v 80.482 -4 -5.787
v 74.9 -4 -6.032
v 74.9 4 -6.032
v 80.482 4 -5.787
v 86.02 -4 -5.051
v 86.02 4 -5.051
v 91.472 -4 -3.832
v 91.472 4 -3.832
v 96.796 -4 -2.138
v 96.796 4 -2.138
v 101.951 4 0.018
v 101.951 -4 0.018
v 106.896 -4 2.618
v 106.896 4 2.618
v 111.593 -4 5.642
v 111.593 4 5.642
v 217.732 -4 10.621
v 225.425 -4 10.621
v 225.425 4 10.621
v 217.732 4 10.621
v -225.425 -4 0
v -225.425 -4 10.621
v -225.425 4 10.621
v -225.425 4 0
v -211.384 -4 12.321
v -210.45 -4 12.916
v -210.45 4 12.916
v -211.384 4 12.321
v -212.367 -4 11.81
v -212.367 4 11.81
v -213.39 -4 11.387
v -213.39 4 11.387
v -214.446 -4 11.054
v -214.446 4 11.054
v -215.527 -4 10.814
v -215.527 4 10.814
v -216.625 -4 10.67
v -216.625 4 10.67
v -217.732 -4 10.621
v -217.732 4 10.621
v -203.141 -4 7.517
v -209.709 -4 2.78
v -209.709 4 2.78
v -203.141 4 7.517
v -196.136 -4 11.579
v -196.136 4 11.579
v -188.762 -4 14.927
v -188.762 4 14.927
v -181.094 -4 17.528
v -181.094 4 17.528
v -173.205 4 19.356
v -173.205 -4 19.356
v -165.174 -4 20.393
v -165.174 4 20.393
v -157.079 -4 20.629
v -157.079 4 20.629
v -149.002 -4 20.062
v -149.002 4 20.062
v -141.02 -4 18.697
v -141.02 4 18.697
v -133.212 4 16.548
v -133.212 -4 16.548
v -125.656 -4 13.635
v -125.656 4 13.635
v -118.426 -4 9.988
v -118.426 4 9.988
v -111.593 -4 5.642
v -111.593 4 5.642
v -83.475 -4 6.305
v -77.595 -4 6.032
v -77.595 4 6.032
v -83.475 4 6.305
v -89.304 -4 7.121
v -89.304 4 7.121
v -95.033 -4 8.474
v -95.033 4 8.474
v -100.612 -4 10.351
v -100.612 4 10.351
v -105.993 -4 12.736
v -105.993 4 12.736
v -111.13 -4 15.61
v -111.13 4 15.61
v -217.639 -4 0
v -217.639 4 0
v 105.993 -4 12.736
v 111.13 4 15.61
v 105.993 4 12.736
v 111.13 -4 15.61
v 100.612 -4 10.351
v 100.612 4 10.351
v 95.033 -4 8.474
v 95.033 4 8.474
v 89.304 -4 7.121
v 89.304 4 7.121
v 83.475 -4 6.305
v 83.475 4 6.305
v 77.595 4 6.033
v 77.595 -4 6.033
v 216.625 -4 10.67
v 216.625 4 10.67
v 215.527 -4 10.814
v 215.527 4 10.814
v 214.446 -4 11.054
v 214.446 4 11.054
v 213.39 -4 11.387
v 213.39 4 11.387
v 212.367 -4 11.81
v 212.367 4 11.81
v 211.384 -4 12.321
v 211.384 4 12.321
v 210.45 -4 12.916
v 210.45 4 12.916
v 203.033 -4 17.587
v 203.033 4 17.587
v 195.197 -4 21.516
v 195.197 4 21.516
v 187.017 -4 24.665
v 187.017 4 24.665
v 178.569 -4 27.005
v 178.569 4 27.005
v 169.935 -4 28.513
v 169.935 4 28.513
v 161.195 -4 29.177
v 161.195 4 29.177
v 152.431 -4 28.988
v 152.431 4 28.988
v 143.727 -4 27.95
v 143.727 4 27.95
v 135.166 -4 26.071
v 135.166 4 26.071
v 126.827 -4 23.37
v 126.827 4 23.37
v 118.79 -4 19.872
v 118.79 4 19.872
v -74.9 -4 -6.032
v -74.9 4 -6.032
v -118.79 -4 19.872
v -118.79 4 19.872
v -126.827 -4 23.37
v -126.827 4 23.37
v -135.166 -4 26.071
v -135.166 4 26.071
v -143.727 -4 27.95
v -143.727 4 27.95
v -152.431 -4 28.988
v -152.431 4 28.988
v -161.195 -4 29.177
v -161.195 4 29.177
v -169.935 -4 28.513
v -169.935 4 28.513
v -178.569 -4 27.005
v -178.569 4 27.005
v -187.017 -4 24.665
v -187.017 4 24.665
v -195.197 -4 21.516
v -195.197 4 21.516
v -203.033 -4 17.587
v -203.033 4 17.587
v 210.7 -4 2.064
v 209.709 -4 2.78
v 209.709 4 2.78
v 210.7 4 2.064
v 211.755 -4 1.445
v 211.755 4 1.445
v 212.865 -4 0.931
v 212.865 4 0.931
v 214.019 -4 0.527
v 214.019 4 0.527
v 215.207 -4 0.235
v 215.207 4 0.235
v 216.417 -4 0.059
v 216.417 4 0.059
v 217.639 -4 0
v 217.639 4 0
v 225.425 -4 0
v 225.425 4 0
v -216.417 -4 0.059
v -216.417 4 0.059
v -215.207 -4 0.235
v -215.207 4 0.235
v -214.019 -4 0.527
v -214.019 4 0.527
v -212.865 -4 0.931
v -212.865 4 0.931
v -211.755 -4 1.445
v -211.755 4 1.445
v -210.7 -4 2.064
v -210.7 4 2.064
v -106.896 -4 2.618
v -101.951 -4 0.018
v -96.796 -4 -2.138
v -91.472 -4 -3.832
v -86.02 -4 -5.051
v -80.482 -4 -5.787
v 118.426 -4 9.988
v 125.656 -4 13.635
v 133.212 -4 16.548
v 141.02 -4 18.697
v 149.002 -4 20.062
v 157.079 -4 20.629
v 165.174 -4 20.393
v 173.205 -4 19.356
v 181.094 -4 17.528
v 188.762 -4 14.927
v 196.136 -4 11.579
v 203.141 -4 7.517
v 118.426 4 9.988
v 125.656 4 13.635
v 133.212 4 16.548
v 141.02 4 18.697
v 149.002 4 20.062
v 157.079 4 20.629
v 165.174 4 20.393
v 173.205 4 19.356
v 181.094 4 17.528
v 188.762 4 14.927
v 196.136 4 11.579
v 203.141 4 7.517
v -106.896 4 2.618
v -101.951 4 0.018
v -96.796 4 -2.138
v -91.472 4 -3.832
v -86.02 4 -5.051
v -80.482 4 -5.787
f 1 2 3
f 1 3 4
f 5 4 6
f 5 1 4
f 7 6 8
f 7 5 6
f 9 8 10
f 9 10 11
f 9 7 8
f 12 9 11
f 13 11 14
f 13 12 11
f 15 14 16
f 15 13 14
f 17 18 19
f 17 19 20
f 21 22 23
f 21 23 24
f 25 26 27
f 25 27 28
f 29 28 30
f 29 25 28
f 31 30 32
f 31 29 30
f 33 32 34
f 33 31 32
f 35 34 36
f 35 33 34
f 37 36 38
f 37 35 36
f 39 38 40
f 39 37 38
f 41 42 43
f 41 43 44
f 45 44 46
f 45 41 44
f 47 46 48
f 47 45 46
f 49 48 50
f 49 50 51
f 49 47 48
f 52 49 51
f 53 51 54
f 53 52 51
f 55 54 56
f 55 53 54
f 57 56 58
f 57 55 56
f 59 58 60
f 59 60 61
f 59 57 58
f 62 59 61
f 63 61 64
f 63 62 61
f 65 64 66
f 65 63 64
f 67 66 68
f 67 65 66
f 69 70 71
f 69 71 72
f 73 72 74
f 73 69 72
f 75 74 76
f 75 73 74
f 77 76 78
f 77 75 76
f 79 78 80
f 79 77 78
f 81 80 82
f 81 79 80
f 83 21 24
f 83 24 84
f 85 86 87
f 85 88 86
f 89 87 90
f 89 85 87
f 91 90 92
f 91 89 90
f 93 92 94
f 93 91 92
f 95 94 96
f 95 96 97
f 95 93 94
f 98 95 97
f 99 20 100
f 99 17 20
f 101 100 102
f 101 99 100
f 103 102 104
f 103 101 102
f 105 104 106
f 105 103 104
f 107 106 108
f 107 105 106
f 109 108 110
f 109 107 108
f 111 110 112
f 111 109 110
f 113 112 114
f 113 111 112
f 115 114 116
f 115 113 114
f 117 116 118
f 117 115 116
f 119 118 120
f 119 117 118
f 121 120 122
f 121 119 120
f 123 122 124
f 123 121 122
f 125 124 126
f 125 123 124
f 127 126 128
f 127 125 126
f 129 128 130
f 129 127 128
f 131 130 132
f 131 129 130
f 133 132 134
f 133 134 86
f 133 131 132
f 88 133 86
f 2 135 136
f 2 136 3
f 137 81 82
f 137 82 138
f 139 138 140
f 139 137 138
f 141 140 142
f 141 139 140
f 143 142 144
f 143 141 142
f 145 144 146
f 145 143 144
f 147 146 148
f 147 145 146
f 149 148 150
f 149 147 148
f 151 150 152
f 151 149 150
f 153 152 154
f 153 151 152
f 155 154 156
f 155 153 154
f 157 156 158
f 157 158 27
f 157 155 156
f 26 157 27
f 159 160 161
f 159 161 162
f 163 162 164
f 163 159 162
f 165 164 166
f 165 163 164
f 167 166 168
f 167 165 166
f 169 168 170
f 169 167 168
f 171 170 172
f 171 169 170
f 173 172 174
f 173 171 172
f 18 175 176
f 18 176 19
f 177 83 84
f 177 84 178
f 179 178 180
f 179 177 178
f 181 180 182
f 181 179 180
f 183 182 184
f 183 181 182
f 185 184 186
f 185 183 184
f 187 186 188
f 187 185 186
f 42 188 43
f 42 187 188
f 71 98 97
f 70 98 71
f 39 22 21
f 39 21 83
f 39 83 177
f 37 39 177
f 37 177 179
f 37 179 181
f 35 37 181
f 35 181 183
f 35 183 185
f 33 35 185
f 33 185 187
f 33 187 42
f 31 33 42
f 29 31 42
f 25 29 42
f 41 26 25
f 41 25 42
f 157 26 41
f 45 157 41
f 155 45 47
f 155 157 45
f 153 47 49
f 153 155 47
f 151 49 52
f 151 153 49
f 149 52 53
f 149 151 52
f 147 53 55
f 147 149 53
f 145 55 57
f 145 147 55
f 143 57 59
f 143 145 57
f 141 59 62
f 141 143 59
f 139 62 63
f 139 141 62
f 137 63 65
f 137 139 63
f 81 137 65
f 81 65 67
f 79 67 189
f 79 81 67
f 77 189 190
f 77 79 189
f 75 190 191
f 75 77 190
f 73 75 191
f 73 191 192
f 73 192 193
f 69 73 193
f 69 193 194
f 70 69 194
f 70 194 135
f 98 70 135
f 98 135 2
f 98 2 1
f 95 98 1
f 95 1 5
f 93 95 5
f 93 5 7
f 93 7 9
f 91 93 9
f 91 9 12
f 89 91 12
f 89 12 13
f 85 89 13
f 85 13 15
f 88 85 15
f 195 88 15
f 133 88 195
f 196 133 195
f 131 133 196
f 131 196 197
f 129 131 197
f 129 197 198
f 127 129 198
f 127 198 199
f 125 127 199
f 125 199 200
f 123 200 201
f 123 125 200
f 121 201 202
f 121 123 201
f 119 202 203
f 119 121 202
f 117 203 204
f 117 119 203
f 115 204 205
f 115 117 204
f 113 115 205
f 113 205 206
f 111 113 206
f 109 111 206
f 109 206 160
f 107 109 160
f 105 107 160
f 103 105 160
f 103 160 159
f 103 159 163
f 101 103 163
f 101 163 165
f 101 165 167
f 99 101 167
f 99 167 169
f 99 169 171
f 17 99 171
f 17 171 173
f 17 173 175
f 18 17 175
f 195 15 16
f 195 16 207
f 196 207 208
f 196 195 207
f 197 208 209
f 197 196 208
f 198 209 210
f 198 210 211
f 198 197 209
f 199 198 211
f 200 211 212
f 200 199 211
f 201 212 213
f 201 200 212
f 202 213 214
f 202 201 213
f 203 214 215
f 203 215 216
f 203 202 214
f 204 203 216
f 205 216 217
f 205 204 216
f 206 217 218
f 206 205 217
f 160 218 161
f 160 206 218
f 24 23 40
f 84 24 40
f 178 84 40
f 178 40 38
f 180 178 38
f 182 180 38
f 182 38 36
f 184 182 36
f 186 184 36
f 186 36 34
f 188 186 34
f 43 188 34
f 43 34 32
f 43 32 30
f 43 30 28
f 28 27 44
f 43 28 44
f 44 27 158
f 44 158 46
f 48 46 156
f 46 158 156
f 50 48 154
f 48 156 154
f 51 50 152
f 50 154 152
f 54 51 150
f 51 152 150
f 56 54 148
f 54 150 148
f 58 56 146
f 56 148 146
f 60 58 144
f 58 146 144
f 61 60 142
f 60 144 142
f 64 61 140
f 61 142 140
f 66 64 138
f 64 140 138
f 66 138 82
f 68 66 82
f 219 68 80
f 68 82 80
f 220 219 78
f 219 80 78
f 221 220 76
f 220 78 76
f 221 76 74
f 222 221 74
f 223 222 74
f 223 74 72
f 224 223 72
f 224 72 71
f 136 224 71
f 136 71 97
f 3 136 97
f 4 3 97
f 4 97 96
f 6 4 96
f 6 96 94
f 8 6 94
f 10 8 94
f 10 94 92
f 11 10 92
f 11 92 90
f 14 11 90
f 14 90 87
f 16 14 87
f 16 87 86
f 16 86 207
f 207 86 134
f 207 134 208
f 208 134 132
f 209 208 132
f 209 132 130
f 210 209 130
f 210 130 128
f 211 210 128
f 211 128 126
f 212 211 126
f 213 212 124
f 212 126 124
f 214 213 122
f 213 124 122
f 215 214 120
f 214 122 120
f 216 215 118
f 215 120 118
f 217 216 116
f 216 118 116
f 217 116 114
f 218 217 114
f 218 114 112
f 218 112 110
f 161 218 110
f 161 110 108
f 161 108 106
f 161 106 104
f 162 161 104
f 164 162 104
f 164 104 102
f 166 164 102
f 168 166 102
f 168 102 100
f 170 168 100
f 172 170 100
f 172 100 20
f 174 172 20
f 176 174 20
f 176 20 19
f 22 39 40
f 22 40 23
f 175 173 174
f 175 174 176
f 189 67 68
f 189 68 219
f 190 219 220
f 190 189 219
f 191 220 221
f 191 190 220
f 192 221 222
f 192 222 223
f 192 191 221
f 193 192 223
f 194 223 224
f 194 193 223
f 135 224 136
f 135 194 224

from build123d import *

# Parameters (mm, degrees)
F1_DEPTH = 4


with BuildPart() as f1:
    # F0 (on Front) → F1 (new body, symmetric)
    with BuildSketch(Plane.XZ):
        with BuildLine():
            ThreePointArc((111.130167, 15.609894), (95.033027, 8.473776), (77.595073, 6.0325))
            Line((77.595073, 6.0325), (-77.595073, 6.0325))
            ThreePointArc((-77.595073, 6.0325), (-95.033027, 8.473776), (-111.130167, 15.609894))
            ThreePointArc((-111.130167, 15.609894), (-161.194556, 29.17665), (-210.450019, 12.91629))
            ThreePointArc((-210.450019, 12.91629), (-213.914336, 11.208725), (-217.731712, 10.621431))
            Line((-217.731712, 10.621431), (-225.425, 10.621431))
            Line((-225.425, 10.621431), (-225.425, 0))
            Line((-225.425, 0), (-225.191568, 0))
            Line((-225.191568, 0), (-217.639167, 0))
            ThreePointArc((-217.639167, 0), (-213.437314, 0.715242), (-209.708742, 2.780405))
            ThreePointArc((-209.708742, 2.780405), (-161.129499, 20.611828), (-111.59344, 5.64248))
            ThreePointArc((-111.59344, 5.64248), (-94.152949, -3.043403), (-74.899881, -6.0325))
            Line((-74.899881, -6.0325), (74.899881, -6.0325))
            ThreePointArc((74.899881, -6.0325), (94.152949, -3.043403), (111.59344, 5.64248))
            ThreePointArc((111.59344, 5.64248), (161.129499, 20.611828), (209.708742, 2.780405))
            ThreePointArc((209.708742, 2.780405), (213.437314, 0.715242), (217.639167, 0))
            Line((217.639167, 0), (225.191568, 0))
            Line((225.191568, 0), (225.425, 0))
            Line((225.425, 0), (225.425, 10.621431))
            Line((225.425, 10.621431), (217.731712, 10.621431))
            ThreePointArc((217.731712, 10.621431), (213.914336, 11.208725), (210.450019, 12.91629))
            ThreePointArc((210.450019, 12.91629), (161.194556, 29.17665), (111.130167, 15.609894))
        make_face()
    extrude(amount=F1_DEPTH, both=True)


solid = f1.part
